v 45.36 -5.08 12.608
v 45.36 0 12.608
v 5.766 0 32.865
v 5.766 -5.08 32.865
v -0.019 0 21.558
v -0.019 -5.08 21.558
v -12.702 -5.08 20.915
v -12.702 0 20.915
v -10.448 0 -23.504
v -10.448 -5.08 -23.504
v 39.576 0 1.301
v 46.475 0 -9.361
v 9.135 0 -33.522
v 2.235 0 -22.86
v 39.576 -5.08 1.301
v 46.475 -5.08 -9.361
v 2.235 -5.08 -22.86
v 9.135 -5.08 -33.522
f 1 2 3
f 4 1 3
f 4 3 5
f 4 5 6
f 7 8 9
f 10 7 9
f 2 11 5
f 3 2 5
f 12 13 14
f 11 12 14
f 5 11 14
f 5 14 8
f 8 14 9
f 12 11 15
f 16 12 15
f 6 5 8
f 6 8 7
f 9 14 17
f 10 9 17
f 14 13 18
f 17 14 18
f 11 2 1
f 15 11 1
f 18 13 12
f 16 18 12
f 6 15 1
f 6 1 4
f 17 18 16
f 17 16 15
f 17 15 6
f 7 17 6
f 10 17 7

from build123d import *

# Parameters (mm, degrees)
F2_DEPTH = 5.08
F3_DEPTH = 12.7
F4_DEPTH = 12.7
F5_DEPTH = 12.7


# Not quite as in the source:
# - the program builds the solid bodies; features that only make, move or delete a surface that nothing else refers to are left out


with BuildPart() as f2:
    # F1 (on Front) → F2 (new body)
    with BuildSketch(Plane.XZ):
        Polygon((39.5757543065, 1.3013935037), (-0.0187108435, 21.5584816091), (2.2353688255, -22.8598751128), align=None)
    extrude(amount=F2_DEPTH)

    # F3 (add): a face of the model
    f3_faces = [f2.faces().sort_by_distance(p)[0] for p in [
        (1.108328991, -2.54, -0.6506967518),
    ]]
    extrude(f3_faces, amount=F3_DEPTH)

    # F4 (add): a face of the model
    f4_faces = [f2.faces().sort_by_distance(p)[0] for p in [
        (20.905561566, -2.54, -10.7792408046),
    ]]
    extrude(f4_faces, amount=F4_DEPTH)

    # F5 (add): a face of the model
    f5_faces = [f2.faces().sort_by_distance(p)[0] for p in [
        (19.7785217315, -2.54, 11.4299375564),
    ]]
    extrude(f5_faces, amount=F5_DEPTH)


solid = f2.part
